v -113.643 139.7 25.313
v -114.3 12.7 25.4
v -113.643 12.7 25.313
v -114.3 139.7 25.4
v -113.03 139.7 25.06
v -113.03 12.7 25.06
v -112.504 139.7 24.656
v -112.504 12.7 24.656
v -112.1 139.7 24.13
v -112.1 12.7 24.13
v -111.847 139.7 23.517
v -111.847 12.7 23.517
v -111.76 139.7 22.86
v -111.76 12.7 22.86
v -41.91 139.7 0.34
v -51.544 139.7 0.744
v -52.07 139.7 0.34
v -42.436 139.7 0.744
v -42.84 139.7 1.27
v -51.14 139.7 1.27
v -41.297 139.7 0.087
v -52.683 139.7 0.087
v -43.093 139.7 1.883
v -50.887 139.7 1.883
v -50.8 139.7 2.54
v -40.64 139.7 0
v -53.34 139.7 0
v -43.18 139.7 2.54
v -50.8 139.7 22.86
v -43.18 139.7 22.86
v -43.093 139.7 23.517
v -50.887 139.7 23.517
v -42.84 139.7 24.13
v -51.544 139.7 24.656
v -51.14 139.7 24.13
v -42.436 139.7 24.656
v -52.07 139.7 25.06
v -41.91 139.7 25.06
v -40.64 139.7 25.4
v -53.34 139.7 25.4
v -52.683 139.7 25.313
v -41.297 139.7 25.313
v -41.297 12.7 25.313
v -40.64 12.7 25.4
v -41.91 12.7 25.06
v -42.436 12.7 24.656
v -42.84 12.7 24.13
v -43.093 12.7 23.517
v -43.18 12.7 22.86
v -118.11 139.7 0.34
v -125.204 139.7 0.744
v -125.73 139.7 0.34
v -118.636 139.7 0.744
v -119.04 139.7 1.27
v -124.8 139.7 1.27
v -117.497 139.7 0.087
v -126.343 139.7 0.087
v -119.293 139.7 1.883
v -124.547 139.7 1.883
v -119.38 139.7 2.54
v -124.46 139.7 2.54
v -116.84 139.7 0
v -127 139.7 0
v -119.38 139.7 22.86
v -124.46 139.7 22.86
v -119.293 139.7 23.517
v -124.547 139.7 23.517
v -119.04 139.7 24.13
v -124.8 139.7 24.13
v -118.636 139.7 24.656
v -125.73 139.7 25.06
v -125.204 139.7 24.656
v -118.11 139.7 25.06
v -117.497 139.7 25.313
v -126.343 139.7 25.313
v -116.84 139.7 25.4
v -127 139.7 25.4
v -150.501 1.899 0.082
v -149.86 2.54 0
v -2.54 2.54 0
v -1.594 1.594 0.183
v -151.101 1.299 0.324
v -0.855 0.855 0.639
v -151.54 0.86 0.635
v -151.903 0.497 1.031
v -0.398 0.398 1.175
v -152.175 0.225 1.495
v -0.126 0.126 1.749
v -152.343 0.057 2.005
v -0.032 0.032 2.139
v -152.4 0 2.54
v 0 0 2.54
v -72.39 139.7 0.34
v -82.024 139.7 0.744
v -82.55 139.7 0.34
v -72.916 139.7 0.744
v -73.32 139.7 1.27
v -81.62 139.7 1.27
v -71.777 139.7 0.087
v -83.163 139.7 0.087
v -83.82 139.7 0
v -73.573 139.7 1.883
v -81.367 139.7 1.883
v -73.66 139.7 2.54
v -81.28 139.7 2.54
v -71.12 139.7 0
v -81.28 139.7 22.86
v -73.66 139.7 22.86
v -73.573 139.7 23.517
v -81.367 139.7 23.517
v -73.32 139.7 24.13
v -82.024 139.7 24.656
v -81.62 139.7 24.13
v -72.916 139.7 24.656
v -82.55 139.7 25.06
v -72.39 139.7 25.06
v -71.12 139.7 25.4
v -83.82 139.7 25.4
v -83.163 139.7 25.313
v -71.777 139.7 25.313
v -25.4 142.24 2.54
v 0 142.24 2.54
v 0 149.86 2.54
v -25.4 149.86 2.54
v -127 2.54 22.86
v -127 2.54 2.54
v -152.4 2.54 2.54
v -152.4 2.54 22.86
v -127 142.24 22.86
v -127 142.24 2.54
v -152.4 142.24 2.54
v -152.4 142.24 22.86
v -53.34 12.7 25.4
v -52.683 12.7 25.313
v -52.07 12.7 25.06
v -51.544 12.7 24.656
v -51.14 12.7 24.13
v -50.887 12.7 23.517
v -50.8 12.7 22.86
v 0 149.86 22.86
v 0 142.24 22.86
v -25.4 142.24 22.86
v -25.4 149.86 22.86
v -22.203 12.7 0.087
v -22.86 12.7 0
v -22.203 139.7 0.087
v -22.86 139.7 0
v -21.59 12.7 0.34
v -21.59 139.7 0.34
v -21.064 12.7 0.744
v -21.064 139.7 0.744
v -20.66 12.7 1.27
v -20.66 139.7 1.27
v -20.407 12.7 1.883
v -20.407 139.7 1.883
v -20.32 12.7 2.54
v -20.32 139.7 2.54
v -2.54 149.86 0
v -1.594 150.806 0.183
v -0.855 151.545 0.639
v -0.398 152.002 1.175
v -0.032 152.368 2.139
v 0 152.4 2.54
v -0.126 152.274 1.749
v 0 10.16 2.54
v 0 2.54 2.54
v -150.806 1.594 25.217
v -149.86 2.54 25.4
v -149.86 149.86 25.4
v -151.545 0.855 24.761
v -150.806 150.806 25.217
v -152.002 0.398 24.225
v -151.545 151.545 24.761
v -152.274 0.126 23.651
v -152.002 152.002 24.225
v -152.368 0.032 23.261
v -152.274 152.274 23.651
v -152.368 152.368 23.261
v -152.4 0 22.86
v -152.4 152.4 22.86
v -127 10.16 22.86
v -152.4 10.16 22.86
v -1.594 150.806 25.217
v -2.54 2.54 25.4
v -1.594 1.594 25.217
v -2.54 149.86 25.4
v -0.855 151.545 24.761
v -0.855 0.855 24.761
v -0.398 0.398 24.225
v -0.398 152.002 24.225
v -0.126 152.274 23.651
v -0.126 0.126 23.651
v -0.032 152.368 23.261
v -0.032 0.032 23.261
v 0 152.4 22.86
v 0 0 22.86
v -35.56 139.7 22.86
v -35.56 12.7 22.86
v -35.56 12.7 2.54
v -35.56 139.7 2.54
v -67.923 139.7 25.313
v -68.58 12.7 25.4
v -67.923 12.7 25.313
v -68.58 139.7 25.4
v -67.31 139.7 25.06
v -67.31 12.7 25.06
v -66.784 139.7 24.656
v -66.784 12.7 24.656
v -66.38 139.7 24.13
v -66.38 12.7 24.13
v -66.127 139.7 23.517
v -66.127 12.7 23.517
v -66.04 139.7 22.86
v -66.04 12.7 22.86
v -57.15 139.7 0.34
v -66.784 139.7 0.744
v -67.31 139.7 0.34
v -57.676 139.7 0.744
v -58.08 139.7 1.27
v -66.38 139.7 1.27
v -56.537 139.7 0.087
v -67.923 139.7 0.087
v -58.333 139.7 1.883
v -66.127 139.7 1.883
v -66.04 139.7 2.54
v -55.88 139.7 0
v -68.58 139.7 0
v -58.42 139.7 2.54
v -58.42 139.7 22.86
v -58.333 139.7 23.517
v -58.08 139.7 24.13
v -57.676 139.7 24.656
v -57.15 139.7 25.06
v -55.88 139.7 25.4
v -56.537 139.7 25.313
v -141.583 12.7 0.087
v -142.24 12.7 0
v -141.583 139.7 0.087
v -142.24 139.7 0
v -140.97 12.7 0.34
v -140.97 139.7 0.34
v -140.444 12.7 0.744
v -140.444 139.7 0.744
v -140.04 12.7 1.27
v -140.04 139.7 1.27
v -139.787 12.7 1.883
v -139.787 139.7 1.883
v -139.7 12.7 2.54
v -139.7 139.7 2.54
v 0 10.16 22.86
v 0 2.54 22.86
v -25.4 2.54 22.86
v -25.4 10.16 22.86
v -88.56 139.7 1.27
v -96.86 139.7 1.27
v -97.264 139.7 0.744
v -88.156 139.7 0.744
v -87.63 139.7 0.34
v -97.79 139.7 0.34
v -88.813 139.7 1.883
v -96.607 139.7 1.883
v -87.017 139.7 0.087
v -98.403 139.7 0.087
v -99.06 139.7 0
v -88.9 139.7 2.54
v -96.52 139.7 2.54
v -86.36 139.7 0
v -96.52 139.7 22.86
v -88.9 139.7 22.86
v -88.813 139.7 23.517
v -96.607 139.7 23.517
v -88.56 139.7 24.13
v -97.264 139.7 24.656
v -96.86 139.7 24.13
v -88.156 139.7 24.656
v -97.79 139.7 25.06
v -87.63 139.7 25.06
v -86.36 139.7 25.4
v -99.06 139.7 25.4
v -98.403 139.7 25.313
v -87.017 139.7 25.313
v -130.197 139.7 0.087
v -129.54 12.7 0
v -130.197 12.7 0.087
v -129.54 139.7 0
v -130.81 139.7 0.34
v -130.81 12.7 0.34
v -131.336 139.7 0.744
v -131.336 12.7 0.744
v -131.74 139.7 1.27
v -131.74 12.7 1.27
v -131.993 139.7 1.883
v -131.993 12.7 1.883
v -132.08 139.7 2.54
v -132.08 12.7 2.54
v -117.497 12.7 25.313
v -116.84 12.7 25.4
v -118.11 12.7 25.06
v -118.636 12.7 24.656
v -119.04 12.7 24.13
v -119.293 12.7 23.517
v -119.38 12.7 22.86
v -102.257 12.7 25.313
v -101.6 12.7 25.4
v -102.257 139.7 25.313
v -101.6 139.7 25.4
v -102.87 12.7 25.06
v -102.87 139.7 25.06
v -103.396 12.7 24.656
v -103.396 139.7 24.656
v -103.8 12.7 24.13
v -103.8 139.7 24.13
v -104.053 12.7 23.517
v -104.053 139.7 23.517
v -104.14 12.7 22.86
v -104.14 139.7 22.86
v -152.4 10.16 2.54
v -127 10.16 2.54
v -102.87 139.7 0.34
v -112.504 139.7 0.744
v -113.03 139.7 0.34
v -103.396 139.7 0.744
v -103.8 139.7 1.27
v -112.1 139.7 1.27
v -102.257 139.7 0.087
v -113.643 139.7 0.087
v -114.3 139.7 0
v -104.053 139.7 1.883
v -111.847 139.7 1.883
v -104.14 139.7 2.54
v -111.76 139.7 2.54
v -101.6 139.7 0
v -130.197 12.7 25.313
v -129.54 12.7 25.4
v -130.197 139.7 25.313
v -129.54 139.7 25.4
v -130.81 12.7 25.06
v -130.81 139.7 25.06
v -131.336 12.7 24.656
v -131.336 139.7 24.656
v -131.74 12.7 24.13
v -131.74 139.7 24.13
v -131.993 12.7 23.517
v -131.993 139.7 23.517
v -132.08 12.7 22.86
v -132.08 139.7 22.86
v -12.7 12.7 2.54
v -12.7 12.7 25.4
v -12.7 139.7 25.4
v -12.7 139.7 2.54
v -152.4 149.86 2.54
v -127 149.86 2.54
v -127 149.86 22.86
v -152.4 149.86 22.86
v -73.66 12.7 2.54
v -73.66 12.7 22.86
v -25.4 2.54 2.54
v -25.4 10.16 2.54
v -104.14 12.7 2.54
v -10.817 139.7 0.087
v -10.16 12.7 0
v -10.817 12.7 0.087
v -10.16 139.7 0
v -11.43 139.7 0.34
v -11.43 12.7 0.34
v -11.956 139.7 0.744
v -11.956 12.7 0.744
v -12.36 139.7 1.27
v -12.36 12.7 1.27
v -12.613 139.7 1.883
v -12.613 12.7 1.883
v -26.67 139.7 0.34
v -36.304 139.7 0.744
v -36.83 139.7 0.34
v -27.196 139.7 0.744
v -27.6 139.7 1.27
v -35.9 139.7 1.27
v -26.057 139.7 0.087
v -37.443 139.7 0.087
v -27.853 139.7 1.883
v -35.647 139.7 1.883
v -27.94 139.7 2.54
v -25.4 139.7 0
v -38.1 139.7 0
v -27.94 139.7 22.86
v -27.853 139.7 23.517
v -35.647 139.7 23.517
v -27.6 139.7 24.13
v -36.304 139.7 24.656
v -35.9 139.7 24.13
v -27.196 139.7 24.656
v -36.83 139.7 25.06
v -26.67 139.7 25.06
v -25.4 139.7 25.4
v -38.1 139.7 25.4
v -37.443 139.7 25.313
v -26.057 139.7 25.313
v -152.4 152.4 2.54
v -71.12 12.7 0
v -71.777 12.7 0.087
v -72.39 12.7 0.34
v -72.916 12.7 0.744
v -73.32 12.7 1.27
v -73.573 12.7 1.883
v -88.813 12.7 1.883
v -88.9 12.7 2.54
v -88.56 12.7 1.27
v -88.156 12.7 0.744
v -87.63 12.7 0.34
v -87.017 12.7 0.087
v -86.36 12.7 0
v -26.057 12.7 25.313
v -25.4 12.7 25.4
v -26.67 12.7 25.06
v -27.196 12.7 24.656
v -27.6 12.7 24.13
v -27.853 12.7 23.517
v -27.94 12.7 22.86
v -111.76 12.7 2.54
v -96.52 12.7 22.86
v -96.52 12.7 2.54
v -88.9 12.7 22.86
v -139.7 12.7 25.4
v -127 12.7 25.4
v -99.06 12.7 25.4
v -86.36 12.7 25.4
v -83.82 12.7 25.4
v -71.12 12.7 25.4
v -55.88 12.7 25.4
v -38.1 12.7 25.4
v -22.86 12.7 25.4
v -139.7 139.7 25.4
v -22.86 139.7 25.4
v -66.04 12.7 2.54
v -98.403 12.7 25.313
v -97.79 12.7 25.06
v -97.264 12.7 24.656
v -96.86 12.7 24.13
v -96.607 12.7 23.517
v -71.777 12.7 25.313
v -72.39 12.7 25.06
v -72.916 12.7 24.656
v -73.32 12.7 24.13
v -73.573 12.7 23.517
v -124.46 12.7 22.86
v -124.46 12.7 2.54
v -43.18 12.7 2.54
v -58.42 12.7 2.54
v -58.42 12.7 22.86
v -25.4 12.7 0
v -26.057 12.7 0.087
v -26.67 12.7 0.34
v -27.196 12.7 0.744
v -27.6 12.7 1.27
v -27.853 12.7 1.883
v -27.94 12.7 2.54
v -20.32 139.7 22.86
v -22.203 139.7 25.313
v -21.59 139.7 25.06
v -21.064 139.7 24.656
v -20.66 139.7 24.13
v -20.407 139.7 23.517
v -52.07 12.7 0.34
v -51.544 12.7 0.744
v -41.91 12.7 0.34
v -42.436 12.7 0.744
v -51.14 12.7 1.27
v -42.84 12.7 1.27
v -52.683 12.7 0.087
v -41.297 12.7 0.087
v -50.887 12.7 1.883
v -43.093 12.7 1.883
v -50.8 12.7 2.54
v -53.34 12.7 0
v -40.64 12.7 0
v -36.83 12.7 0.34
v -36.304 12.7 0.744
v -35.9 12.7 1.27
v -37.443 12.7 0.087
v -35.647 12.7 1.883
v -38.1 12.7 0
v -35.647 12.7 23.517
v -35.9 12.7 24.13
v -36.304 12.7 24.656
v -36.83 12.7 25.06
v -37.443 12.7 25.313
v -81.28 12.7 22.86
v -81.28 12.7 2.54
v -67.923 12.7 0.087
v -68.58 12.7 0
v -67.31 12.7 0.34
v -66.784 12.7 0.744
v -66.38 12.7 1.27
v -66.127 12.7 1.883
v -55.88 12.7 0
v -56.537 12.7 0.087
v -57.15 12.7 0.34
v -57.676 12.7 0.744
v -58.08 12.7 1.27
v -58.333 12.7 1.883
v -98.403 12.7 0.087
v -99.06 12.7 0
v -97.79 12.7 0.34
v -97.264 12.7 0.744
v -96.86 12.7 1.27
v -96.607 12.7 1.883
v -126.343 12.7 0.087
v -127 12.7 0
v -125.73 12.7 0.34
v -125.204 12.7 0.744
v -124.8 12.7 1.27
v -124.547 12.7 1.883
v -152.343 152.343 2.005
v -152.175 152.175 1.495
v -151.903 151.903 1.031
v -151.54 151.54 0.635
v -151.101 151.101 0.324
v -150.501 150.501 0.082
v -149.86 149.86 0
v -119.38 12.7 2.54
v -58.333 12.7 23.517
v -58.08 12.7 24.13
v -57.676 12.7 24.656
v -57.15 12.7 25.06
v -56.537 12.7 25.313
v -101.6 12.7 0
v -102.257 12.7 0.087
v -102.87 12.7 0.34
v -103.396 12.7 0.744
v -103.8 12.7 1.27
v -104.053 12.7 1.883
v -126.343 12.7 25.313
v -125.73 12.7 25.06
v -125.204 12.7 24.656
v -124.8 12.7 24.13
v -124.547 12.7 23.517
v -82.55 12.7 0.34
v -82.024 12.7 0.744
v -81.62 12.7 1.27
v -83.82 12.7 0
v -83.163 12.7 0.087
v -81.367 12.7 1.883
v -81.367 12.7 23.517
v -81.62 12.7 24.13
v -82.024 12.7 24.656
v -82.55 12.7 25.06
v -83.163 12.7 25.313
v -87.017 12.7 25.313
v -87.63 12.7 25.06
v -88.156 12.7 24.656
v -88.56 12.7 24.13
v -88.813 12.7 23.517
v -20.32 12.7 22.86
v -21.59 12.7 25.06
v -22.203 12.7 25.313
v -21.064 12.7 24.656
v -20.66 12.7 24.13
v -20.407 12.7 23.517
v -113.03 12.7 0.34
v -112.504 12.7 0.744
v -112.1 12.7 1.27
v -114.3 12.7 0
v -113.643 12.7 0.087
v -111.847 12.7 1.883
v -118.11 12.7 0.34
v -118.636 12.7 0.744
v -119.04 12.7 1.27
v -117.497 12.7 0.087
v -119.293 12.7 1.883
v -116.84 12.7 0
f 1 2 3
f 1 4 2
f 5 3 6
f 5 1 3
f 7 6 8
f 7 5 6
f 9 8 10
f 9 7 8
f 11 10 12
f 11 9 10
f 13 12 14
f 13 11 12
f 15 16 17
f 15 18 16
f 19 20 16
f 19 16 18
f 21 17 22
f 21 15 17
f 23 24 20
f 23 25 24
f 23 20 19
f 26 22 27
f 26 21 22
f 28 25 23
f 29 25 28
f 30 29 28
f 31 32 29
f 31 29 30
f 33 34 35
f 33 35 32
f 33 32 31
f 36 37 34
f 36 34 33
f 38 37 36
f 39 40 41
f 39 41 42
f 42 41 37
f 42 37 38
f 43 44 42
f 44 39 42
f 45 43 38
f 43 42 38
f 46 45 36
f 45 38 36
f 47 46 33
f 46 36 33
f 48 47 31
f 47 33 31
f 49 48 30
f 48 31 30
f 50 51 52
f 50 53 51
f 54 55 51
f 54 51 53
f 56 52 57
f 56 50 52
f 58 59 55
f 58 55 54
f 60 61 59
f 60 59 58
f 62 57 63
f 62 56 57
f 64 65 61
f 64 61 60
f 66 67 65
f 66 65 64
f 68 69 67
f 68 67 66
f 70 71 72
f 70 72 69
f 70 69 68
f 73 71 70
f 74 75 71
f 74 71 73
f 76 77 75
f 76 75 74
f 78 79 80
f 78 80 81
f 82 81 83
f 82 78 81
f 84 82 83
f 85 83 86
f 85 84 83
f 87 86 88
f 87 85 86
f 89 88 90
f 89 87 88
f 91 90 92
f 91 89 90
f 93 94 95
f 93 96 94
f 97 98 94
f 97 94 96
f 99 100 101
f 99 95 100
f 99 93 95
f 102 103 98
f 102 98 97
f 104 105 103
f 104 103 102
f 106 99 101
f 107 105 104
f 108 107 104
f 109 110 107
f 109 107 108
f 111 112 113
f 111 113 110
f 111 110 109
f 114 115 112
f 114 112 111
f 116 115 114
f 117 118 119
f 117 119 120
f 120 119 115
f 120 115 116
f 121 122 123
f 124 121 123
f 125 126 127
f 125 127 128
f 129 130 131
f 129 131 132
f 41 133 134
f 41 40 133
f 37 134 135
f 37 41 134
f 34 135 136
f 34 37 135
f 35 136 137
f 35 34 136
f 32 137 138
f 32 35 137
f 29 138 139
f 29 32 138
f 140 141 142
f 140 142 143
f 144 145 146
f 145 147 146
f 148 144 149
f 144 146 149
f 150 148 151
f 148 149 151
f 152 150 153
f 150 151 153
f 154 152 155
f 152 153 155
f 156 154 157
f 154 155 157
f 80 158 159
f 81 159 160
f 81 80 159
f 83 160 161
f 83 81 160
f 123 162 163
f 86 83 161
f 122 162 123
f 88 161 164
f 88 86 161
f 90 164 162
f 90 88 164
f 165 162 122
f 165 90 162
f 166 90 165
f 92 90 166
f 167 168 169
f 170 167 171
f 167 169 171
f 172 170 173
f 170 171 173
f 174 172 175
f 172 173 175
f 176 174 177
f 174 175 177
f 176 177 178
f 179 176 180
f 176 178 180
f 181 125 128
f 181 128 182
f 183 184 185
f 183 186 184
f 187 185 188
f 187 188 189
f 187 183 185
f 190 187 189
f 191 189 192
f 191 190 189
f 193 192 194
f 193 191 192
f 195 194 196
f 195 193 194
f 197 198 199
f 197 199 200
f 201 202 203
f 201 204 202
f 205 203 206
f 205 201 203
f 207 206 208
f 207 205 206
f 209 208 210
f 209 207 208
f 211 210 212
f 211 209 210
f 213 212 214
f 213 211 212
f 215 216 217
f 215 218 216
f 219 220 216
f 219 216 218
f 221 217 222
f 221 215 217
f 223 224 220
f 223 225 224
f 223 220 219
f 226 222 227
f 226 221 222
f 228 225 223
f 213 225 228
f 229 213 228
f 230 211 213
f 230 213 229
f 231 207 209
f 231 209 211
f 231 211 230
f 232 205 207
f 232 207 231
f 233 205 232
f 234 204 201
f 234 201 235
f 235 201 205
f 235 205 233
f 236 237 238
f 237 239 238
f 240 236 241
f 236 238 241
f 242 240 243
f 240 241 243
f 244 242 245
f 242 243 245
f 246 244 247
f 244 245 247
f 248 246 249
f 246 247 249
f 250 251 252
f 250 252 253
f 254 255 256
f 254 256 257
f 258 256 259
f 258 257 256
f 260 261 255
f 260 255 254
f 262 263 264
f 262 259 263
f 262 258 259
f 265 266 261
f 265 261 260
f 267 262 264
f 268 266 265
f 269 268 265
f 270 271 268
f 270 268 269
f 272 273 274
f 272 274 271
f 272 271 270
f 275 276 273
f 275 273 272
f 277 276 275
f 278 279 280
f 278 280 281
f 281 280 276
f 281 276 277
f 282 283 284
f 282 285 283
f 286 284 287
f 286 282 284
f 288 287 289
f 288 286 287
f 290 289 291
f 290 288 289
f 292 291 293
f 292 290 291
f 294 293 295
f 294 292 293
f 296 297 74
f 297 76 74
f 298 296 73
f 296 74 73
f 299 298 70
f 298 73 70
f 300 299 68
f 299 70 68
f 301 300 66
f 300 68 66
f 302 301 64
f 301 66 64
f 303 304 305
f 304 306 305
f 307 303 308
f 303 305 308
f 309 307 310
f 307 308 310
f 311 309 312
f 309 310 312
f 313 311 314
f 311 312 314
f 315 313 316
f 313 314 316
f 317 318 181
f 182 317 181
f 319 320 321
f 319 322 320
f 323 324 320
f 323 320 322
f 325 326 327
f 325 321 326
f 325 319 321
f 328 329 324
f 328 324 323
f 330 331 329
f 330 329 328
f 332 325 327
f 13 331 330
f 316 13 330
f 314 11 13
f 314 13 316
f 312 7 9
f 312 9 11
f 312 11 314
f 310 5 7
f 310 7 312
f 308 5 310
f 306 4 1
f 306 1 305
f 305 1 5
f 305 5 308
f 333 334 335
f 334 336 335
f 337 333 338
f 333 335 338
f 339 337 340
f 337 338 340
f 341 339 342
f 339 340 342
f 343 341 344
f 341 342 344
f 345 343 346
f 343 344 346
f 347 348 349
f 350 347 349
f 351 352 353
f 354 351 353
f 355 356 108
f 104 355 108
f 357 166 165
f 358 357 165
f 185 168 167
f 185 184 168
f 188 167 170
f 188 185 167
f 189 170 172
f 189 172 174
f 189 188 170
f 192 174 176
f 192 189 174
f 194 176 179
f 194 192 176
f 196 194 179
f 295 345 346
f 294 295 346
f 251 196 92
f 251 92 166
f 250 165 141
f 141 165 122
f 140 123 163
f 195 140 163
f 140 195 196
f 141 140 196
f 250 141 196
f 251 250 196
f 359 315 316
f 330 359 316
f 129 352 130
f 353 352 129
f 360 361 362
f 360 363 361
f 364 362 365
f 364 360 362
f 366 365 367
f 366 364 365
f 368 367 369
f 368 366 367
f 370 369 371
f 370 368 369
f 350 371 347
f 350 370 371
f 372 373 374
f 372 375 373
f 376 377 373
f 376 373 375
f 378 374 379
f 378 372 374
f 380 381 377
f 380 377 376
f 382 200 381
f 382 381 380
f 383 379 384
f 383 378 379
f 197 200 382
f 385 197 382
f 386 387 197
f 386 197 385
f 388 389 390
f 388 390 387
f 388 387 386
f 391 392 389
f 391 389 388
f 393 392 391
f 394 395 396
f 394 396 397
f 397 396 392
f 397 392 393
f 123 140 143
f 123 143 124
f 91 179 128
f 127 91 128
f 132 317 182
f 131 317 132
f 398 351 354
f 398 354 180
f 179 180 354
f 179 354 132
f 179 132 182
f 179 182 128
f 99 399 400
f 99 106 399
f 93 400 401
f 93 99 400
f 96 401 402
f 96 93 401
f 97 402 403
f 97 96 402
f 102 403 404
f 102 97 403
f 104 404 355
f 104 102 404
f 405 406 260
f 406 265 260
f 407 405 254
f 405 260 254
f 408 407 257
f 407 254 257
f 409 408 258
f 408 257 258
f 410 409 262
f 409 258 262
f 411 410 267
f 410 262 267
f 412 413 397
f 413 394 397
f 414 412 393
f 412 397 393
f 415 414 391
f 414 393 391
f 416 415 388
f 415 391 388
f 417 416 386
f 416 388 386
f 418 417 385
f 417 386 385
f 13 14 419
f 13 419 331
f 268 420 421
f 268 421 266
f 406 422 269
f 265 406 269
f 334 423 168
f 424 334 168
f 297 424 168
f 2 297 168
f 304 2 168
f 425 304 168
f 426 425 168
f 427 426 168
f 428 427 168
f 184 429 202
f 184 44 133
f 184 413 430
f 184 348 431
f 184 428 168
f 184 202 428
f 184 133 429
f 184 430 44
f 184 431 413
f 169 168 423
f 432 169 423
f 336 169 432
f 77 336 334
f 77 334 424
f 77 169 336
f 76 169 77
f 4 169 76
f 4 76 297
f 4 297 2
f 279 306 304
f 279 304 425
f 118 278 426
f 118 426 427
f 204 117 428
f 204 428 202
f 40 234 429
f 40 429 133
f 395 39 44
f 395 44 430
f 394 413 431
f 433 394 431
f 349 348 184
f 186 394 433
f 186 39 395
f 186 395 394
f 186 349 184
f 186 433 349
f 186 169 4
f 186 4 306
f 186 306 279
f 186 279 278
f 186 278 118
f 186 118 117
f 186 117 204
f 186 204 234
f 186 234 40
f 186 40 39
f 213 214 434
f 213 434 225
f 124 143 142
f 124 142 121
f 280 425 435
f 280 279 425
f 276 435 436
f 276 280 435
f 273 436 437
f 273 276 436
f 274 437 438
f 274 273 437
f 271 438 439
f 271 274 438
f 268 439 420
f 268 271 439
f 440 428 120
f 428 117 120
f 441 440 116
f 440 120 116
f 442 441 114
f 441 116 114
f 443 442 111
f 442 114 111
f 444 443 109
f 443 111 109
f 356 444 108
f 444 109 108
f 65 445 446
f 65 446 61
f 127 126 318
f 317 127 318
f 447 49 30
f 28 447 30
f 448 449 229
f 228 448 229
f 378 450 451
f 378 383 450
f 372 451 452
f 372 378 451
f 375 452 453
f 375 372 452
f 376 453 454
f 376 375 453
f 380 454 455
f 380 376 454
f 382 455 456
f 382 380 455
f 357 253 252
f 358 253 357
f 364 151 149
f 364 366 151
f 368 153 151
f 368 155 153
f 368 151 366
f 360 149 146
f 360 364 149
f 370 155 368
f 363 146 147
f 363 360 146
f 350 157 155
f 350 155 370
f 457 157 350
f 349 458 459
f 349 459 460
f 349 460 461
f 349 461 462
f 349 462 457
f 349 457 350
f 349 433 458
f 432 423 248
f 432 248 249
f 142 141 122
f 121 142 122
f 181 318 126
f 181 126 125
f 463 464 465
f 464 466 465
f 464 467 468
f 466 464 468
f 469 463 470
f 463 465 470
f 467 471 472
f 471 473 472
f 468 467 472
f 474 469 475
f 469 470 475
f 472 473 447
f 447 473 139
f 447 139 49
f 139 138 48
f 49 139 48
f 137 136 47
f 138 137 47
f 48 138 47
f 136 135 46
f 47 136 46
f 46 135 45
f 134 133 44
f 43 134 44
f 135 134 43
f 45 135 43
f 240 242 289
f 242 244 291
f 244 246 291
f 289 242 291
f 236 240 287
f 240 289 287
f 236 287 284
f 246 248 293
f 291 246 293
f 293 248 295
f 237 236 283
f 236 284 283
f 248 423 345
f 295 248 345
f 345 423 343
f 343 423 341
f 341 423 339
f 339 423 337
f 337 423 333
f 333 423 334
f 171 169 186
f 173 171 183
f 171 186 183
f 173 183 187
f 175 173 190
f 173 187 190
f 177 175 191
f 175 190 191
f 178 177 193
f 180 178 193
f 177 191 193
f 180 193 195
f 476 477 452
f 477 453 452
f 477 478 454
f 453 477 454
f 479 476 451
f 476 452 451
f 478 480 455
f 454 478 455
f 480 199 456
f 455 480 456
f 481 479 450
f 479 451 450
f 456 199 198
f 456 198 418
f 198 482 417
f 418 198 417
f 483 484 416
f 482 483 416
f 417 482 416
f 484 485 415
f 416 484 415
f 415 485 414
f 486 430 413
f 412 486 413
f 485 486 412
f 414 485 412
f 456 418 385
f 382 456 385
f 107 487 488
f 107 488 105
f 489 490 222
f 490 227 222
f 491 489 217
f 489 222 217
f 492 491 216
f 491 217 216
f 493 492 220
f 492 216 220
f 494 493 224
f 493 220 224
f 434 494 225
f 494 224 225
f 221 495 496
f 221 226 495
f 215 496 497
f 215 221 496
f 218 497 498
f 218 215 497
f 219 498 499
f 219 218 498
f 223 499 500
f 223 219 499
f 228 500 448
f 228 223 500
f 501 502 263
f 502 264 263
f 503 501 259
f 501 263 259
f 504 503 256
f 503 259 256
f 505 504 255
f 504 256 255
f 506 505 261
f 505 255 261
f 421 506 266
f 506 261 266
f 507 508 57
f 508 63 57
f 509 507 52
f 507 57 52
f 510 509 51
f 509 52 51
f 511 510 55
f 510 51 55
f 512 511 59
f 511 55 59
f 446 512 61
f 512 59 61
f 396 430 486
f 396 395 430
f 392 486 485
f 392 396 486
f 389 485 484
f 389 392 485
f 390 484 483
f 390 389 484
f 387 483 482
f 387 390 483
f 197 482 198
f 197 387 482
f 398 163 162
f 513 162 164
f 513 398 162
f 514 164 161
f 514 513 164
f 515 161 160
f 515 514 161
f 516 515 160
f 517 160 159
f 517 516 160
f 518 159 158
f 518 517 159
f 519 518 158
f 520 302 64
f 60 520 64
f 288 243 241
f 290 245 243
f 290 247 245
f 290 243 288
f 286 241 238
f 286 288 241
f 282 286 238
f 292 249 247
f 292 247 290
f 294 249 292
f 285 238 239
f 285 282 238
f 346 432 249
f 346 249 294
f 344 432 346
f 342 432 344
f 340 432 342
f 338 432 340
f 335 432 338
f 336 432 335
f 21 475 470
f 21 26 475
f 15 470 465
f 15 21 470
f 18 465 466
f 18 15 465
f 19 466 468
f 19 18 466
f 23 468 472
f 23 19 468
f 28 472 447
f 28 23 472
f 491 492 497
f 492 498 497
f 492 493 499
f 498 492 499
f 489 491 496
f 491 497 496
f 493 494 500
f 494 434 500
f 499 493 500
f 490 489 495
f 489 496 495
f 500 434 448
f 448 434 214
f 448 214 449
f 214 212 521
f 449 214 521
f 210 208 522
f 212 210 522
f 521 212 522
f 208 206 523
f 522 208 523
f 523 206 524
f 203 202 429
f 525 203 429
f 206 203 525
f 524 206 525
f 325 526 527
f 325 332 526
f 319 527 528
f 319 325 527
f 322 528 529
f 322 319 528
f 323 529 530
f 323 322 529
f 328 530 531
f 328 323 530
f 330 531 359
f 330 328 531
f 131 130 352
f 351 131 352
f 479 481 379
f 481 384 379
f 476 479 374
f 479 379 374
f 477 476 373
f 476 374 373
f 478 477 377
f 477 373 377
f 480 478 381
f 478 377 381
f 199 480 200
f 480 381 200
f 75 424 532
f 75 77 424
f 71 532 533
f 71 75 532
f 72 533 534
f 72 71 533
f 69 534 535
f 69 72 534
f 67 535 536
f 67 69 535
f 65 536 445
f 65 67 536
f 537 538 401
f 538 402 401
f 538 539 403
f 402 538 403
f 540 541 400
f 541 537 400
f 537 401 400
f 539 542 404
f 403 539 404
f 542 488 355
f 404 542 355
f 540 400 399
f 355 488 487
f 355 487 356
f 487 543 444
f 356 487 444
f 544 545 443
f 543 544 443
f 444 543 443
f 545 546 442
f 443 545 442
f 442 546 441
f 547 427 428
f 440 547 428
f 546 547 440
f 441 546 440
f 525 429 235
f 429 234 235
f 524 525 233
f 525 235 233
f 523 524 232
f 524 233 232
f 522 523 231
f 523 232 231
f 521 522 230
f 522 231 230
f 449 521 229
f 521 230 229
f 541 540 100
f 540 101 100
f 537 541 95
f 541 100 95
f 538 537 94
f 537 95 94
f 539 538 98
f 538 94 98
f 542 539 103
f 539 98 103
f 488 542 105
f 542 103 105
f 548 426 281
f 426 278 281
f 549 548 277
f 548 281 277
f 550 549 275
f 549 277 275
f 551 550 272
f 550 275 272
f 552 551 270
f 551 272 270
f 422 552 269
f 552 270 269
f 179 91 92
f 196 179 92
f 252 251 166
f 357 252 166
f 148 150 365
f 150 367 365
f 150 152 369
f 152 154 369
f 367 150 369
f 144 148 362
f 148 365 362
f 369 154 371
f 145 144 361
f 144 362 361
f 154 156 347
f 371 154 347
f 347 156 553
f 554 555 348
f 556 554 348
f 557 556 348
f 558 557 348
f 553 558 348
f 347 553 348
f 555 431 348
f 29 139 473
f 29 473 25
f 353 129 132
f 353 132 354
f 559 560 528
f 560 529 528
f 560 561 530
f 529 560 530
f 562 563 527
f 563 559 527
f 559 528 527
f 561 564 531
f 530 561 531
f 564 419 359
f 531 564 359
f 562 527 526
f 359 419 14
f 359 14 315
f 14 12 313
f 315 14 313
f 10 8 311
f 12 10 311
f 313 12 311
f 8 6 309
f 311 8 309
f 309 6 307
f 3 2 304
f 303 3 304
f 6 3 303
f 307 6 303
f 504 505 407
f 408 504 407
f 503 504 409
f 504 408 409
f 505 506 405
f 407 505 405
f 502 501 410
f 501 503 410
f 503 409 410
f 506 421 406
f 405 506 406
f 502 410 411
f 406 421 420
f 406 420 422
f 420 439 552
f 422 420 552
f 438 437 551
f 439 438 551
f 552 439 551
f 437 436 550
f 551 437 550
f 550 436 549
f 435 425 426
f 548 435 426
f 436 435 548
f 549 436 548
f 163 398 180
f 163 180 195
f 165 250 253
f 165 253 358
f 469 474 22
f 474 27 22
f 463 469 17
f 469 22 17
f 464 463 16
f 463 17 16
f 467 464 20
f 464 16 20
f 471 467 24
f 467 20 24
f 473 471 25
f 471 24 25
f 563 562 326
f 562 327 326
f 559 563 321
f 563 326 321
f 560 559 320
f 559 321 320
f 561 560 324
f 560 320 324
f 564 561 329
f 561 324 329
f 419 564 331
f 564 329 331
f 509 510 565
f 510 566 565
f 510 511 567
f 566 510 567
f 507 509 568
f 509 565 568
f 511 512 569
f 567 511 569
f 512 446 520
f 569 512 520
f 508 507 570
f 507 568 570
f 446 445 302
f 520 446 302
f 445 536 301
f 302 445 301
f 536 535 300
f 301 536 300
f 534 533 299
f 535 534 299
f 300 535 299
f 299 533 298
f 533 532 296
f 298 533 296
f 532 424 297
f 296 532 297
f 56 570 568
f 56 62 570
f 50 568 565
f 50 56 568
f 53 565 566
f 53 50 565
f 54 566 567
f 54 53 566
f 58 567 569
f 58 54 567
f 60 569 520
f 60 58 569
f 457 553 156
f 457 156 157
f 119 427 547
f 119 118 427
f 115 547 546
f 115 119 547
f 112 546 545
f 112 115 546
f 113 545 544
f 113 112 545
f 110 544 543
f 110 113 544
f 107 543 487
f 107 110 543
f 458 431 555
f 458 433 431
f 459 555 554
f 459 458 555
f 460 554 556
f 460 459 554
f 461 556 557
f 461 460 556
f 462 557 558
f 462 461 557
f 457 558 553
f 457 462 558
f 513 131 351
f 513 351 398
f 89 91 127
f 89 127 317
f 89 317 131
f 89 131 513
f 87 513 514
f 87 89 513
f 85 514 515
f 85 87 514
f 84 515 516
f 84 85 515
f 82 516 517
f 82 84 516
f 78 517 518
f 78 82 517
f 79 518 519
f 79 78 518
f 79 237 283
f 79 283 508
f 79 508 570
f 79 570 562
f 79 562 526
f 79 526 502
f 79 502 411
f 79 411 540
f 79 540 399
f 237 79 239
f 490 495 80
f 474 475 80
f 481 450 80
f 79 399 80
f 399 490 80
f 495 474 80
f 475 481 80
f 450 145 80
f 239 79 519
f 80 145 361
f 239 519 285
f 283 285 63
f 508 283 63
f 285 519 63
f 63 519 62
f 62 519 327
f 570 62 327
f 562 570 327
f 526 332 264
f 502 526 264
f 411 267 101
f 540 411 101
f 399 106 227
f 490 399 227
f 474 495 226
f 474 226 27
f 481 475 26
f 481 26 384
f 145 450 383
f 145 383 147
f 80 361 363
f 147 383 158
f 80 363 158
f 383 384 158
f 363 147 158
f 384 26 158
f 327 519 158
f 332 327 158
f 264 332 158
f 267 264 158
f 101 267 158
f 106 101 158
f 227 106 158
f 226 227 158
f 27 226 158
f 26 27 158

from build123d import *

# Parameters (mm, degrees)
SKETCH1_W           = 152.4
SKETCH1_H           = 152.4
BOSS_EXTRUDE1_DEPTH = 25.4
SKETCH7_W           = 20.32
SKETCH7_H           = 7.62
CUT_EXTRUDE4_DEPTH  = 25.4
SKETCH8_W           = 20.32
SKETCH8_H           = 7.62
CUT_EXTRUDE5_DEPTH  = 25.4
SKETCH9_W           = 7.62
SKETCH9_H           = 127
SKETCH9_W_2         = 5.08
CUT_EXTRUDE6_DEPTH  = 25.4
FILLET3_R           = 2.54
FILLET4_R           = 2.54
FILLET5_DEPTH       = 152.4
FILLET5_START       = -153
FILLET5_2_DEPTH     = 154
FILLET6_R           = 2.54
SKETCH11_W          = 20.32
SKETCH11_H          = 7.62
CUT_EXTRUDE8_DEPTH  = 25.4
SKETCH12_W          = 20.32
SKETCH12_H          = 7.62
CUT_EXTRUDE9_DEPTH  = 25.4


with BuildPart() as part:
    # Sketch1 → Boss-Extrude1 (new body)
    with BuildSketch(Plane.XY):
        with Locations((-76.2, 76.2)):
            Rectangle(SKETCH1_W, SKETCH1_H)
    extrude(amount=BOSS_EXTRUDE1_DEPTH)

    # Sketch7 → Cut-Extrude4 (cut)
    with BuildSketch(Plane(origin=(0, 0, 0), x_dir=(0, 0, -1), z_dir=(1, 0, 0))):
        with Locations((-12.7, 146.05)):
            Rectangle(SKETCH7_W, SKETCH7_H)
    extrude(amount=-CUT_EXTRUDE4_DEPTH, mode=Mode.SUBTRACT)

    # Sketch8 → Cut-Extrude5 (cut)
    with BuildSketch(Plane(origin=(0, 0, 0), x_dir=(0, 0, -1), z_dir=(1, 0, 0))):
        with Locations((-12.7, 6.35)):
            Rectangle(SKETCH8_W, SKETCH8_H)
    extrude(amount=-CUT_EXTRUDE5_DEPTH, mode=Mode.SUBTRACT)

    # Sketch9 → Cut-Extrude6 (cut)
    with BuildSketch(Plane.XY.offset(25.4)):
        with Locations((-135.89, 76.2)):
            Rectangle(SKETCH9_W, SKETCH9_H)
        with Locations((-121.92, 76.2)):
            Rectangle(SKETCH9_W_2, SKETCH9_H)
        with Locations((-107.95, 76.2)):
            Rectangle(SKETCH9_W, SKETCH9_H)
        with Locations((-92.71, 76.2)):
            Rectangle(SKETCH9_W, SKETCH9_H)
        with Locations((-77.47, 76.2)):
            Rectangle(SKETCH9_W, SKETCH9_H)
        with Locations((-62.23, 76.2)):
            Rectangle(SKETCH9_W, SKETCH9_H)
        with Locations((-46.99, 76.2)):
            Rectangle(SKETCH9_W, SKETCH9_H)
        with Locations((-31.75, 76.2)):
            Rectangle(SKETCH9_W, SKETCH9_H)
        with Locations((-16.51, 76.2)):
            Rectangle(SKETCH9_W, SKETCH9_H)
    extrude(amount=-CUT_EXTRUDE6_DEPTH, mode=Mode.SUBTRACT)

    # Fillet3
    fillet3_edges = [part.edges().sort_by_distance(p)[0] for p in [
        (-73.66, 76.2, 25.4),
        (-81.28, 76.2, 25.4),
        (-58.42, 76.2, 25.4),
        (-66.04, 76.2, 25.4),
        (-43.18, 76.2, 25.4),
        (-50.8, 76.2, 25.4),
        (-27.94, 76.2, 25.4),
        (-35.56, 76.2, 25.4),
        (-20.32, 76.2, 25.4),
        (-132.08, 76.2, 25.4),
        (-119.38, 76.2, 25.4),
        (-124.46, 76.2, 25.4),
        (-104.14, 76.2, 25.4),
        (-111.76, 76.2, 25.4),
        (-88.9, 76.2, 25.4),
        (-96.52, 76.2, 25.4),
    ]]
    fillet(fillet3_edges, radius=FILLET3_R)

    # Fillet4
    fillet4_edges = [part.edges().sort_by_distance(p)[0] for p in [
        (-81.28, 76.2, 0),
        (-73.66, 76.2, 0),
        (-66.04, 76.2, 0),
        (-58.42, 76.2, 0),
        (-50.8, 76.2, 0),
        (-43.18, 76.2, 0),
        (-35.56, 76.2, 0),
        (-27.94, 76.2, 0),
        (-20.32, 76.2, 0),
        (-12.7, 76.2, 0),
        (-139.7, 76.2, 0),
        (-132.08, 76.2, 0),
        (-124.46, 76.2, 0),
        (-119.38, 76.2, 0),
        (-111.76, 76.2, 0),
        (-104.14, 76.2, 0),
        (-96.52, 76.2, 0),
        (-88.9, 76.2, 0),
    ]]
    fillet(fillet4_edges, radius=FILLET4_R)

    # Fillet5: read off the stored shape, not the designer's step
    # Fillet5 outline → Fillet5 (cut)
    with BuildSketch(Plane(origin=(0, 0, 0), x_dir=(1, 0, 0), z_dir=(0, 1, 0))):
        with BuildLine():
            Line((-152.4, 0), (-152.4, -2.54))
            ThreePointArc((-152.4, -2.54), (-151.656051224, -0.743948776), (-149.86, 0))
            Line((-149.86, 0), (-152.4, 0))
        make_face()
        with BuildLine():
            Line((0, 0), (-2.54, 0))
            ThreePointArc((-2.54, 0), (-0.743948776, -0.743948776), (0, -2.54))
            Line((0, -2.54), (0, 0))
        make_face()
    extrude(amount=FILLET5_DEPTH, mode=Mode.SUBTRACT)

    # Fillet5 2 outline → Fillet5 2 (cut)
    with BuildSketch(Plane.YZ.offset(FILLET5_START)):
        with BuildLine():
            ThreePointArc((152.4, 2.54), (151.656051224, 0.743948776), (149.86, 0))
            Line((149.86, 0), (152.4, 0))
            Line((152.4, 0), (152.4, 2.54))
        make_face()
        with BuildLine():
            ThreePointArc((2.54, 0), (0.743948776, 0.743948776), (0, 2.54))
            Line((0, 2.54), (0, 0))
            Line((0, 0), (2.54, 0))
        make_face()
    extrude(amount=FILLET5_2_DEPTH, mode=Mode.SUBTRACT)

    # Fillet6
    fillet6_edges = [part.edges().sort_by_distance(p)[0] for p in [
        (-152.4, 76.2, 25.4),
        (-76.2, 0, 25.4),
        (0, 76.2, 25.4),
        (-76.2, 152.4, 25.4),
    ]]
    fillet(fillet6_edges, radius=FILLET6_R - 0.0001)  # a hair under: the kernel refuses the full size

    # Sketch11 → Cut-Extrude8 (cut)
    with BuildSketch(Plane.ZY.offset(152.4)):
        with Locations((12.7, 146.05)):
            Rectangle(SKETCH11_W, SKETCH11_H)
    extrude(amount=-CUT_EXTRUDE8_DEPTH, mode=Mode.SUBTRACT)

    # Sketch12 → Cut-Extrude9 (cut)
    with BuildSketch(Plane.ZY.offset(152.4)):
        with Locations((12.7, 6.35)):
            Rectangle(SKETCH12_W, SKETCH12_H)
    extrude(amount=-CUT_EXTRUDE9_DEPTH, mode=Mode.SUBTRACT)


solid = part.part
